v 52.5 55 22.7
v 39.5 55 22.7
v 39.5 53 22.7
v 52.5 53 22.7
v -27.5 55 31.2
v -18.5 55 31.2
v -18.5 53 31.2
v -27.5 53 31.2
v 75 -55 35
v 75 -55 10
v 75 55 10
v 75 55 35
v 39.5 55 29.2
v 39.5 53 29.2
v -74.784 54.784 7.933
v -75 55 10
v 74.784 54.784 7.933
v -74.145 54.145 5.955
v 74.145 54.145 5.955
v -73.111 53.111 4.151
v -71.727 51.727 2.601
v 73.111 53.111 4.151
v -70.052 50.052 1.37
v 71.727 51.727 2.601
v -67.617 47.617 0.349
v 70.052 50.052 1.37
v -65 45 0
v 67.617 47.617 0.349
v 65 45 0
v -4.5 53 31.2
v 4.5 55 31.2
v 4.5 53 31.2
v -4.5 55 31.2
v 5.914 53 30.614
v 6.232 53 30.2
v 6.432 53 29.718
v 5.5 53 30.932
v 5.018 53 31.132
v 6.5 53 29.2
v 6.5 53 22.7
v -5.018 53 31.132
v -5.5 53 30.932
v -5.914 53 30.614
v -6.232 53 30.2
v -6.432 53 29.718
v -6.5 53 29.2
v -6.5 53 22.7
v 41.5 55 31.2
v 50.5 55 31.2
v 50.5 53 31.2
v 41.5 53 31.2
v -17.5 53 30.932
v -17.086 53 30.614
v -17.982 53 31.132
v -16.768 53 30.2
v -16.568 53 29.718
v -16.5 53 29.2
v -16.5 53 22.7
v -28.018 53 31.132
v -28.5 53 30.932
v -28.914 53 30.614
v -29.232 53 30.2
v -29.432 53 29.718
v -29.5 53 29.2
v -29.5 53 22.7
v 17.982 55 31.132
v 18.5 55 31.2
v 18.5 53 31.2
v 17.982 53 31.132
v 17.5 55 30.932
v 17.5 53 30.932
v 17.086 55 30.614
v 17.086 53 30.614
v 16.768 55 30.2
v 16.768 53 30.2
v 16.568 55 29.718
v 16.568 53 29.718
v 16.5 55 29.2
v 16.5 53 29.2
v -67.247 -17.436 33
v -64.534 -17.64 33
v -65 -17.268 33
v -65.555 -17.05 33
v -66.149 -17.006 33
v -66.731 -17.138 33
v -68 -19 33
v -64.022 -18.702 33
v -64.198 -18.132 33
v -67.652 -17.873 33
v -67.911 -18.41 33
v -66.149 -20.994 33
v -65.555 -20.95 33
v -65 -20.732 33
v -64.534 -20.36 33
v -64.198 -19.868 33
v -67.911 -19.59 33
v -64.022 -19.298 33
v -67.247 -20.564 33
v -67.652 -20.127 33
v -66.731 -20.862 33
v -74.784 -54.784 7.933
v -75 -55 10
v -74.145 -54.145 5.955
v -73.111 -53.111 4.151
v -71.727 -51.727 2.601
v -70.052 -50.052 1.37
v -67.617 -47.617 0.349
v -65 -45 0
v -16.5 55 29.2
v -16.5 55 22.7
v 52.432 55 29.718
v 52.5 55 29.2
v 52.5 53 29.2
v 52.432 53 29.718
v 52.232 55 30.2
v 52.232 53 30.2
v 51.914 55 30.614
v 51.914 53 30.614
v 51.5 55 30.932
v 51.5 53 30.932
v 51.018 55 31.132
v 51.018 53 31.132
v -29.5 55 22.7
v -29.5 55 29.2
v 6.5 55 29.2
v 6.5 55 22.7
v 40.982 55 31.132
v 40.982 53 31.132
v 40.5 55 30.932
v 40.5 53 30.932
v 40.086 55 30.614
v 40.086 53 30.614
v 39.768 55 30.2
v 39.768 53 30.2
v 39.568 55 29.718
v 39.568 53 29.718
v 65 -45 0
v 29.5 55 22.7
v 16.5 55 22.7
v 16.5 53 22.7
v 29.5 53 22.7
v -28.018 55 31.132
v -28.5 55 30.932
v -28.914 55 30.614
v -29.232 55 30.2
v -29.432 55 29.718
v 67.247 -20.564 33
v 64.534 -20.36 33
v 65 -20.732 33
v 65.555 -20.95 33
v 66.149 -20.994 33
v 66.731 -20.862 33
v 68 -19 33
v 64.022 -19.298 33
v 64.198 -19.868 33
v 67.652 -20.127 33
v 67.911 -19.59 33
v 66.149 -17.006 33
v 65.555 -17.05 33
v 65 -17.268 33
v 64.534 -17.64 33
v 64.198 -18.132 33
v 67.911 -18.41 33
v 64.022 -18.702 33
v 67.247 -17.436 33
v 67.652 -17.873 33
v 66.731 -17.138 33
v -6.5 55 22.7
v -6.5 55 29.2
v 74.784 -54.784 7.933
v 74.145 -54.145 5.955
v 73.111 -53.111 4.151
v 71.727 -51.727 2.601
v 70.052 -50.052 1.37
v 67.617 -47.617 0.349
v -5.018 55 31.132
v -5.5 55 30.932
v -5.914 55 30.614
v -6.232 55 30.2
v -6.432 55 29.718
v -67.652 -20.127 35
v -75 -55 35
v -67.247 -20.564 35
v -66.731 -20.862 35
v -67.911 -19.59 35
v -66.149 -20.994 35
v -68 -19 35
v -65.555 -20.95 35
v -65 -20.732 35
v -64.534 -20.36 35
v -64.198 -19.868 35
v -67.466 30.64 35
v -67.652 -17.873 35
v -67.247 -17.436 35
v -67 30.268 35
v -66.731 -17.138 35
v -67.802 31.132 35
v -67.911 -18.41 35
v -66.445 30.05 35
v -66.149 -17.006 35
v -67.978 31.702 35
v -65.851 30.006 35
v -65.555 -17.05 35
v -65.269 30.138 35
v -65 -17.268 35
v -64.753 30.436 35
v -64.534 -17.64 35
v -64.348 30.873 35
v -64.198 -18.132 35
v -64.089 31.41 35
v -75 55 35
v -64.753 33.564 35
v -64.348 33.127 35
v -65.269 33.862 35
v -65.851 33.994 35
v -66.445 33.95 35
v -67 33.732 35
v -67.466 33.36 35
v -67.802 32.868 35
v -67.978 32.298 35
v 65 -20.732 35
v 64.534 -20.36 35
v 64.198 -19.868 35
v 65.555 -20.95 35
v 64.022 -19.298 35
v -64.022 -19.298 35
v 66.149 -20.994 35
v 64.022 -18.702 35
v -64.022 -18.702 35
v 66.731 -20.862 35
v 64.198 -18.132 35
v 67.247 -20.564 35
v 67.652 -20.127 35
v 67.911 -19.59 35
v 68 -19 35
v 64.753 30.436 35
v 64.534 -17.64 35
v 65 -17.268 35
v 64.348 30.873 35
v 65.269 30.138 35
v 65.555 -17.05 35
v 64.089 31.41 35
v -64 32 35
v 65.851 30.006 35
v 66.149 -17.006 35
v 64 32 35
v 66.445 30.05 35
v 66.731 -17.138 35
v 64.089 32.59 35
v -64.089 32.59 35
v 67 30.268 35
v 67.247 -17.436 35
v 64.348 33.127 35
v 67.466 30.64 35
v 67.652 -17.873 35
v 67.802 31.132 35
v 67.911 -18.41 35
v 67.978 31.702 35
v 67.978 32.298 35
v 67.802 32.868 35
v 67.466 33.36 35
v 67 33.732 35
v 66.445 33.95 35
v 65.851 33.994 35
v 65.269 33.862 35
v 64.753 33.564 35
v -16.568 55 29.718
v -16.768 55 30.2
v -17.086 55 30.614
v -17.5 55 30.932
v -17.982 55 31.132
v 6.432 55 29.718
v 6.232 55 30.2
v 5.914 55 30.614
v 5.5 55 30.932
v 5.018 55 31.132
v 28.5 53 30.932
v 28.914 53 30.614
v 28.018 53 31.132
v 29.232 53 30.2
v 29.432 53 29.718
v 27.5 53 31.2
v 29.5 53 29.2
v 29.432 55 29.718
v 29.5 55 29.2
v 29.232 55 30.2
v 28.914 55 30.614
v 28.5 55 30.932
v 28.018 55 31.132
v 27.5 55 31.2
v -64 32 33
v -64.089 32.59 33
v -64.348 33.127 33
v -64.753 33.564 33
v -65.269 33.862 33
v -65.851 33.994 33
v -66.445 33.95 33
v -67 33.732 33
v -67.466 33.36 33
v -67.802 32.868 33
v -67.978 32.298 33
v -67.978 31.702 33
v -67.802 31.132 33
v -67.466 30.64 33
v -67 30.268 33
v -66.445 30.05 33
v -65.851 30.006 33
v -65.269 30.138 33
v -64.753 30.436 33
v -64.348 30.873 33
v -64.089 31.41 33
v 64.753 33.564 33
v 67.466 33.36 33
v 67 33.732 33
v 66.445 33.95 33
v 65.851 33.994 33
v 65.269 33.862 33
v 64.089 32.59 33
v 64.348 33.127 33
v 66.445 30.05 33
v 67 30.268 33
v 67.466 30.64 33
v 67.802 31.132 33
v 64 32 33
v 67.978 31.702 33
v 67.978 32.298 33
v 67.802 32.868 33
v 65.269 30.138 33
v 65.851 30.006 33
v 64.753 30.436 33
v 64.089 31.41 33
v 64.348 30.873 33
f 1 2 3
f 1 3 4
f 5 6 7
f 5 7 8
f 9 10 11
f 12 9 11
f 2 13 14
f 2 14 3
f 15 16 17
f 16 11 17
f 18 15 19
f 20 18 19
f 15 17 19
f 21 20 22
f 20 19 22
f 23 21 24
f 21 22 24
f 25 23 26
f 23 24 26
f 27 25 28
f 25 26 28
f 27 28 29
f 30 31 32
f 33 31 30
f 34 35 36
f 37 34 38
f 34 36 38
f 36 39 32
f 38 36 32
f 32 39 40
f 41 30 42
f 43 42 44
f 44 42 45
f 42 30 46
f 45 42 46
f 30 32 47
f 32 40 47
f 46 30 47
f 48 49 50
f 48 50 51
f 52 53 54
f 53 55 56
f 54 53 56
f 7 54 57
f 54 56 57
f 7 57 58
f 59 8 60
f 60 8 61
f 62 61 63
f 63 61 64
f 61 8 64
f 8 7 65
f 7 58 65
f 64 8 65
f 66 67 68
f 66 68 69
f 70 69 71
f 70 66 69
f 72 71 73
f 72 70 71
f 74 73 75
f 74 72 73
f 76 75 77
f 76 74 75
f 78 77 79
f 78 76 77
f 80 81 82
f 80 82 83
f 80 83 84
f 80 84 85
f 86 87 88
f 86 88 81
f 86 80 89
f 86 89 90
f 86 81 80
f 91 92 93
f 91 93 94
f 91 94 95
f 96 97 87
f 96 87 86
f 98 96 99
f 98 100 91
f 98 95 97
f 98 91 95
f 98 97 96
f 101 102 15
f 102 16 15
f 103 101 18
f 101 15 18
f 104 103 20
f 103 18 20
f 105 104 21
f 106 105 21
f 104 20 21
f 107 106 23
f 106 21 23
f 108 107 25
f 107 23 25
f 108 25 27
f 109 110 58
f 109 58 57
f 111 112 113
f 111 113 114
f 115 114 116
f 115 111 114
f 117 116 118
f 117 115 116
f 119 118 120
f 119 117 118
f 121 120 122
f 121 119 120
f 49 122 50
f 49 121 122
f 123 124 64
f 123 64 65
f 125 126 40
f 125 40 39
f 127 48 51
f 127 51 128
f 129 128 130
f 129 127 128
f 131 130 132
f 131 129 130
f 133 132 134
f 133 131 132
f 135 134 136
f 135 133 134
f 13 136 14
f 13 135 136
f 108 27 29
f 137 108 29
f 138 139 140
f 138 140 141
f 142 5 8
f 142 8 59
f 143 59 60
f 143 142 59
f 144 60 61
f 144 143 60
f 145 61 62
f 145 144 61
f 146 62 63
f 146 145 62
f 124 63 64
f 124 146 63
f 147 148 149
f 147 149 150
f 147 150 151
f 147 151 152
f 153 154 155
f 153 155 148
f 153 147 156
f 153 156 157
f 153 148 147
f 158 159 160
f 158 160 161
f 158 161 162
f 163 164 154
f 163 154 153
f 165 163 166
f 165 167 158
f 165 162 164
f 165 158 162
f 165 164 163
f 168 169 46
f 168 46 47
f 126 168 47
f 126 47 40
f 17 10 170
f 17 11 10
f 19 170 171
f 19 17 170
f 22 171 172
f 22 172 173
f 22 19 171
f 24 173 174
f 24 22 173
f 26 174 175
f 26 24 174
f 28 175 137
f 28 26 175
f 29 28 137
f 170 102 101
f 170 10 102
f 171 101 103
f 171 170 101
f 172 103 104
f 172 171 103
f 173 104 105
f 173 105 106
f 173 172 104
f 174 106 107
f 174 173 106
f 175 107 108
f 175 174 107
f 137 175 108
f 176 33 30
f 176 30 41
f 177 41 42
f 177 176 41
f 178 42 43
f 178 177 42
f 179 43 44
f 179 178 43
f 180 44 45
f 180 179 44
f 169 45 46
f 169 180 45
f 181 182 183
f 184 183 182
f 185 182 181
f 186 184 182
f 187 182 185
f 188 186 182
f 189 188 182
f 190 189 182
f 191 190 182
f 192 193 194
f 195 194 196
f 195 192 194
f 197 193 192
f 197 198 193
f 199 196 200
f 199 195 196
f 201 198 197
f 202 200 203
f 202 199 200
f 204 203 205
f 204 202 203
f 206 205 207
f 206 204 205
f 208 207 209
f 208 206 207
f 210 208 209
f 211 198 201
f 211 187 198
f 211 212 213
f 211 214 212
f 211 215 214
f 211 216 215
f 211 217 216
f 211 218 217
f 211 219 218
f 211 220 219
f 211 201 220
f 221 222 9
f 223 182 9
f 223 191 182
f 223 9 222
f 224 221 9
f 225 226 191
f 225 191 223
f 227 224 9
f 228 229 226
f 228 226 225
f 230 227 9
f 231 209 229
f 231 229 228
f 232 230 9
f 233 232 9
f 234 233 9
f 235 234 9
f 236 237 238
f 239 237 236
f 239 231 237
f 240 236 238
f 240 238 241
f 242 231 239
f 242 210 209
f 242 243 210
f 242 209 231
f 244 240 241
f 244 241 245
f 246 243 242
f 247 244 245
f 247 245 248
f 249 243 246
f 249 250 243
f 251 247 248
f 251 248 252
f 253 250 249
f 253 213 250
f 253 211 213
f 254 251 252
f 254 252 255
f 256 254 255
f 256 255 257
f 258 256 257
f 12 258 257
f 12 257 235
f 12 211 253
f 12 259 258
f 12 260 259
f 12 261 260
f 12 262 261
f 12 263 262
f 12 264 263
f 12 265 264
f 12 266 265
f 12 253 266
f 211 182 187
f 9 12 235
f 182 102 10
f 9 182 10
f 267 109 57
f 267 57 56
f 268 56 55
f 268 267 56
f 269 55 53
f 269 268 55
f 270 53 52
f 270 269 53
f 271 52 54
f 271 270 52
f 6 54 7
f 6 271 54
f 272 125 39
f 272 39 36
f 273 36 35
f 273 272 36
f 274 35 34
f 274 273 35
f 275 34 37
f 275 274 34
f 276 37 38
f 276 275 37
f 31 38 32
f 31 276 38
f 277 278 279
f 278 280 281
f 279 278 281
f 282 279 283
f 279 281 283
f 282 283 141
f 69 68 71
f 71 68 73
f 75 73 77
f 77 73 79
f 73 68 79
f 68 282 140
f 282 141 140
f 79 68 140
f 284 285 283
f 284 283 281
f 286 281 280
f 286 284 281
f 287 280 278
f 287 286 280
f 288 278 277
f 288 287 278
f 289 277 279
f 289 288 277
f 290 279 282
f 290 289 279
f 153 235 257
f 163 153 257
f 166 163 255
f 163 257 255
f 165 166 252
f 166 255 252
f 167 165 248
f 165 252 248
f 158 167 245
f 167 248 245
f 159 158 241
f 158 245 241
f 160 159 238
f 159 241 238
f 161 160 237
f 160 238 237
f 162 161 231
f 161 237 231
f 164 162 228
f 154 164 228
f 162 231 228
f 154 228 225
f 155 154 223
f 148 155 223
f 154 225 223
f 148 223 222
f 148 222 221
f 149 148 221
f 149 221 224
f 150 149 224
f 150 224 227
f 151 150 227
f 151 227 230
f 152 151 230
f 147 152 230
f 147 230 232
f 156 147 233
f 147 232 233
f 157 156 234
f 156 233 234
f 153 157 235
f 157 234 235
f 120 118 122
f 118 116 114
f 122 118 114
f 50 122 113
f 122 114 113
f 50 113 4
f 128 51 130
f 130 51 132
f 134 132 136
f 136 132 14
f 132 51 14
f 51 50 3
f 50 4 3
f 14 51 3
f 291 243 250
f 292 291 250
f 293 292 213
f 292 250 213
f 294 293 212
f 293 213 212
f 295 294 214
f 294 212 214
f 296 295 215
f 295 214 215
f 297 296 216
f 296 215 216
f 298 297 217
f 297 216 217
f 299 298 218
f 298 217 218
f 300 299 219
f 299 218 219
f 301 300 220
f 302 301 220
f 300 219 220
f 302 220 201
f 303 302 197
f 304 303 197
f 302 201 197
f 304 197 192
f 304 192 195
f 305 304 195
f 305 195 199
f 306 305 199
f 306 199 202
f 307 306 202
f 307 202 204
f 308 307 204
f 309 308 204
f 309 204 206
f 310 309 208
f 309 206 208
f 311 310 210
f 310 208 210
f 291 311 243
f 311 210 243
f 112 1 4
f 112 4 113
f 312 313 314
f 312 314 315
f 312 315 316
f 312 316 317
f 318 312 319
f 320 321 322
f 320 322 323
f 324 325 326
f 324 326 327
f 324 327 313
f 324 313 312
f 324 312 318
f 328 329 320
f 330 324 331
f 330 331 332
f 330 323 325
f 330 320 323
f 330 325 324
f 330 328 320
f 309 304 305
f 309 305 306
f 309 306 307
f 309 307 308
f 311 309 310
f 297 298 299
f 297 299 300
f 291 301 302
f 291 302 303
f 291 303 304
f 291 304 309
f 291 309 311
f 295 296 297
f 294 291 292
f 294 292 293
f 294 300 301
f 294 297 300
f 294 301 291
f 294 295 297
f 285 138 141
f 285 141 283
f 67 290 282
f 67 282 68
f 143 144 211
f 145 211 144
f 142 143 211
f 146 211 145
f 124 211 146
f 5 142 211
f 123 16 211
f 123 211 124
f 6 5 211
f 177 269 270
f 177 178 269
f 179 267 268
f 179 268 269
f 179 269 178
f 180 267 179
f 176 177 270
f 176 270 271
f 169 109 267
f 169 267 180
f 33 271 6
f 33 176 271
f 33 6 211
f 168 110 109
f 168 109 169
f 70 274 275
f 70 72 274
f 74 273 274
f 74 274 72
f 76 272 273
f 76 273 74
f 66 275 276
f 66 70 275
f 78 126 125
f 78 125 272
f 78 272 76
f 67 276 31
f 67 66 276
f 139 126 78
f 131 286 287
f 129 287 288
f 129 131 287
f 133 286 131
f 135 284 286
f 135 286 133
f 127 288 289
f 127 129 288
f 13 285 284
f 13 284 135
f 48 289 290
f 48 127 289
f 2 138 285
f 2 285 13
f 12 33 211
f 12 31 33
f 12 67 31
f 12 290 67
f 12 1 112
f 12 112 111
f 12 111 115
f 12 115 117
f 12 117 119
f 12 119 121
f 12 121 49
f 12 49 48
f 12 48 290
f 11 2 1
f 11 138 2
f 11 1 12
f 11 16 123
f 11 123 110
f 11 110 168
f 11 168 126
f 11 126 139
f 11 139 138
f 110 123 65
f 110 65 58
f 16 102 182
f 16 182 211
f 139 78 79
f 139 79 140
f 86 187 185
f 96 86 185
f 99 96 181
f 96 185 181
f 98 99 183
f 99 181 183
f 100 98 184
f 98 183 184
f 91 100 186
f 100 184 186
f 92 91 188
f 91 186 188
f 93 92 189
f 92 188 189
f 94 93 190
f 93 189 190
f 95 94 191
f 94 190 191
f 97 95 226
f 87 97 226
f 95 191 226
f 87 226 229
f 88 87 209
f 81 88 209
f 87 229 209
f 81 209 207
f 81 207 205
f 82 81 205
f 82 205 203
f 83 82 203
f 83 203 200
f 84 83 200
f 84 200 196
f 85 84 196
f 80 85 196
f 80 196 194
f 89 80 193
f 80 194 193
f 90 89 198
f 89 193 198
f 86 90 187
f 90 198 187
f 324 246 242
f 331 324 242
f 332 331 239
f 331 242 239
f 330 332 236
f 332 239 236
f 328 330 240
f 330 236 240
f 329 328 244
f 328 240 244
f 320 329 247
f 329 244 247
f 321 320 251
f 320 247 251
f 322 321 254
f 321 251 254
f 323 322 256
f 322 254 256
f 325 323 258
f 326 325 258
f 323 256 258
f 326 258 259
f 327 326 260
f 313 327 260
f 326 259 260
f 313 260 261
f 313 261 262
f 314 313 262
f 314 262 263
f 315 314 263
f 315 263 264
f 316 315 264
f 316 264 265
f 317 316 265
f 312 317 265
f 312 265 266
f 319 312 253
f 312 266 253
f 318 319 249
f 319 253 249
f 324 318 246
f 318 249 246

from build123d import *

# Parameters (mm, degrees)
SKETCH_1_W          = 150
SKETCH_1_H          = 110
EXTRUDE_1_DEPTH     = 35
FILLET_1_R          = 10
SKETCH_4_R          = 2
CUT_EXTRUDE_1_DEPTH = 2
CUT_EXTRUDE_2_DEPTH = 2


with BuildPart() as part:
    # 草图1 → 凸台-拉伸1 (new body)
    with BuildSketch(Plane.XY):
        Rectangle(SKETCH_1_W, SKETCH_1_H)
    extrude(amount=EXTRUDE_1_DEPTH)

    # 圆角1
    fillet_1_edges = [part.edges().sort_by_distance(p)[0] for p in [
        (-75, 0, 0),
        (0, -55, 0),
        (75, 0, 0),
        (0, 55, 0),
    ]]
    fillet(fillet_1_edges, radius=FILLET_1_R)

    # 草图4 → 切除-拉伸1 (cut)
    with BuildSketch(Plane.XY.offset(35)):
        with Locations((-66, 32)):
            Circle(SKETCH_4_R)
        with Locations((-66, -19)):
            Circle(SKETCH_4_R)
        with Locations((66, -19)):
            Circle(SKETCH_4_R)
        with Locations((66, 32)):
            Circle(SKETCH_4_R)
    extrude(amount=-CUT_EXTRUDE_1_DEPTH, mode=Mode.SUBTRACT)

    # 草图5 → 切除-拉伸2 (cut)
    with BuildSketch(Plane(origin=(0, 55, 0), x_dir=(1, 0, 0), z_dir=(0, 1, 0))):
        with BuildLine():
            Line((-6.5, -22.7), (6.5, -22.7))
            Line((6.5, -22.7), (6.5, -29.2))
            ThreePointArc((6.5, -29.2), (5.914213562, -30.614213562), (4.5, -31.2))
            Line((4.5, -31.2), (-4.5, -31.2))
            ThreePointArc((-4.5, -31.2), (-5.914213562, -30.614213562), (-6.5, -29.2))
            Line((-6.5, -29.2), (-6.5, -22.7))
        make_face()
        with BuildLine():
            Line((16.5, -22.7), (29.5, -22.7))
            Line((29.5, -22.7), (29.5, -29.2))
            ThreePointArc((29.5, -29.2), (28.914213562, -30.614213562), (27.5, -31.2))
            Line((27.5, -31.2), (18.5, -31.2))
            ThreePointArc((18.5, -31.2), (17.085786438, -30.614213562), (16.5, -29.2))
            Line((16.5, -29.2), (16.5, -22.7))
        make_face()
        with BuildLine():
            Line((39.5, -22.7), (52.5, -22.7))
            Line((52.5, -22.7), (52.5, -29.2))
            ThreePointArc((52.5, -29.2), (51.914213562, -30.614213562), (50.5, -31.2))
            Line((50.5, -31.2), (41.5, -31.2))
            ThreePointArc((41.5, -31.2), (40.085786438, -30.614213562), (39.5, -29.2))
            Line((39.5, -29.2), (39.5, -22.7))
        make_face()
        with BuildLine():
            Line((-29.5, -22.7), (-16.5, -22.7))
            Line((-16.5, -22.7), (-16.5, -29.2))
            ThreePointArc((-16.5, -29.2), (-17.085786438, -30.614213562), (-18.5, -31.2))
            Line((-18.5, -31.2), (-27.5, -31.2))
            ThreePointArc((-27.5, -31.2), (-28.914213562, -30.614213562), (-29.5, -29.2))
            Line((-29.5, -29.2), (-29.5, -22.7))
        make_face()
    extrude(amount=-CUT_EXTRUDE_2_DEPTH, mode=Mode.SUBTRACT)


solid = part.part
